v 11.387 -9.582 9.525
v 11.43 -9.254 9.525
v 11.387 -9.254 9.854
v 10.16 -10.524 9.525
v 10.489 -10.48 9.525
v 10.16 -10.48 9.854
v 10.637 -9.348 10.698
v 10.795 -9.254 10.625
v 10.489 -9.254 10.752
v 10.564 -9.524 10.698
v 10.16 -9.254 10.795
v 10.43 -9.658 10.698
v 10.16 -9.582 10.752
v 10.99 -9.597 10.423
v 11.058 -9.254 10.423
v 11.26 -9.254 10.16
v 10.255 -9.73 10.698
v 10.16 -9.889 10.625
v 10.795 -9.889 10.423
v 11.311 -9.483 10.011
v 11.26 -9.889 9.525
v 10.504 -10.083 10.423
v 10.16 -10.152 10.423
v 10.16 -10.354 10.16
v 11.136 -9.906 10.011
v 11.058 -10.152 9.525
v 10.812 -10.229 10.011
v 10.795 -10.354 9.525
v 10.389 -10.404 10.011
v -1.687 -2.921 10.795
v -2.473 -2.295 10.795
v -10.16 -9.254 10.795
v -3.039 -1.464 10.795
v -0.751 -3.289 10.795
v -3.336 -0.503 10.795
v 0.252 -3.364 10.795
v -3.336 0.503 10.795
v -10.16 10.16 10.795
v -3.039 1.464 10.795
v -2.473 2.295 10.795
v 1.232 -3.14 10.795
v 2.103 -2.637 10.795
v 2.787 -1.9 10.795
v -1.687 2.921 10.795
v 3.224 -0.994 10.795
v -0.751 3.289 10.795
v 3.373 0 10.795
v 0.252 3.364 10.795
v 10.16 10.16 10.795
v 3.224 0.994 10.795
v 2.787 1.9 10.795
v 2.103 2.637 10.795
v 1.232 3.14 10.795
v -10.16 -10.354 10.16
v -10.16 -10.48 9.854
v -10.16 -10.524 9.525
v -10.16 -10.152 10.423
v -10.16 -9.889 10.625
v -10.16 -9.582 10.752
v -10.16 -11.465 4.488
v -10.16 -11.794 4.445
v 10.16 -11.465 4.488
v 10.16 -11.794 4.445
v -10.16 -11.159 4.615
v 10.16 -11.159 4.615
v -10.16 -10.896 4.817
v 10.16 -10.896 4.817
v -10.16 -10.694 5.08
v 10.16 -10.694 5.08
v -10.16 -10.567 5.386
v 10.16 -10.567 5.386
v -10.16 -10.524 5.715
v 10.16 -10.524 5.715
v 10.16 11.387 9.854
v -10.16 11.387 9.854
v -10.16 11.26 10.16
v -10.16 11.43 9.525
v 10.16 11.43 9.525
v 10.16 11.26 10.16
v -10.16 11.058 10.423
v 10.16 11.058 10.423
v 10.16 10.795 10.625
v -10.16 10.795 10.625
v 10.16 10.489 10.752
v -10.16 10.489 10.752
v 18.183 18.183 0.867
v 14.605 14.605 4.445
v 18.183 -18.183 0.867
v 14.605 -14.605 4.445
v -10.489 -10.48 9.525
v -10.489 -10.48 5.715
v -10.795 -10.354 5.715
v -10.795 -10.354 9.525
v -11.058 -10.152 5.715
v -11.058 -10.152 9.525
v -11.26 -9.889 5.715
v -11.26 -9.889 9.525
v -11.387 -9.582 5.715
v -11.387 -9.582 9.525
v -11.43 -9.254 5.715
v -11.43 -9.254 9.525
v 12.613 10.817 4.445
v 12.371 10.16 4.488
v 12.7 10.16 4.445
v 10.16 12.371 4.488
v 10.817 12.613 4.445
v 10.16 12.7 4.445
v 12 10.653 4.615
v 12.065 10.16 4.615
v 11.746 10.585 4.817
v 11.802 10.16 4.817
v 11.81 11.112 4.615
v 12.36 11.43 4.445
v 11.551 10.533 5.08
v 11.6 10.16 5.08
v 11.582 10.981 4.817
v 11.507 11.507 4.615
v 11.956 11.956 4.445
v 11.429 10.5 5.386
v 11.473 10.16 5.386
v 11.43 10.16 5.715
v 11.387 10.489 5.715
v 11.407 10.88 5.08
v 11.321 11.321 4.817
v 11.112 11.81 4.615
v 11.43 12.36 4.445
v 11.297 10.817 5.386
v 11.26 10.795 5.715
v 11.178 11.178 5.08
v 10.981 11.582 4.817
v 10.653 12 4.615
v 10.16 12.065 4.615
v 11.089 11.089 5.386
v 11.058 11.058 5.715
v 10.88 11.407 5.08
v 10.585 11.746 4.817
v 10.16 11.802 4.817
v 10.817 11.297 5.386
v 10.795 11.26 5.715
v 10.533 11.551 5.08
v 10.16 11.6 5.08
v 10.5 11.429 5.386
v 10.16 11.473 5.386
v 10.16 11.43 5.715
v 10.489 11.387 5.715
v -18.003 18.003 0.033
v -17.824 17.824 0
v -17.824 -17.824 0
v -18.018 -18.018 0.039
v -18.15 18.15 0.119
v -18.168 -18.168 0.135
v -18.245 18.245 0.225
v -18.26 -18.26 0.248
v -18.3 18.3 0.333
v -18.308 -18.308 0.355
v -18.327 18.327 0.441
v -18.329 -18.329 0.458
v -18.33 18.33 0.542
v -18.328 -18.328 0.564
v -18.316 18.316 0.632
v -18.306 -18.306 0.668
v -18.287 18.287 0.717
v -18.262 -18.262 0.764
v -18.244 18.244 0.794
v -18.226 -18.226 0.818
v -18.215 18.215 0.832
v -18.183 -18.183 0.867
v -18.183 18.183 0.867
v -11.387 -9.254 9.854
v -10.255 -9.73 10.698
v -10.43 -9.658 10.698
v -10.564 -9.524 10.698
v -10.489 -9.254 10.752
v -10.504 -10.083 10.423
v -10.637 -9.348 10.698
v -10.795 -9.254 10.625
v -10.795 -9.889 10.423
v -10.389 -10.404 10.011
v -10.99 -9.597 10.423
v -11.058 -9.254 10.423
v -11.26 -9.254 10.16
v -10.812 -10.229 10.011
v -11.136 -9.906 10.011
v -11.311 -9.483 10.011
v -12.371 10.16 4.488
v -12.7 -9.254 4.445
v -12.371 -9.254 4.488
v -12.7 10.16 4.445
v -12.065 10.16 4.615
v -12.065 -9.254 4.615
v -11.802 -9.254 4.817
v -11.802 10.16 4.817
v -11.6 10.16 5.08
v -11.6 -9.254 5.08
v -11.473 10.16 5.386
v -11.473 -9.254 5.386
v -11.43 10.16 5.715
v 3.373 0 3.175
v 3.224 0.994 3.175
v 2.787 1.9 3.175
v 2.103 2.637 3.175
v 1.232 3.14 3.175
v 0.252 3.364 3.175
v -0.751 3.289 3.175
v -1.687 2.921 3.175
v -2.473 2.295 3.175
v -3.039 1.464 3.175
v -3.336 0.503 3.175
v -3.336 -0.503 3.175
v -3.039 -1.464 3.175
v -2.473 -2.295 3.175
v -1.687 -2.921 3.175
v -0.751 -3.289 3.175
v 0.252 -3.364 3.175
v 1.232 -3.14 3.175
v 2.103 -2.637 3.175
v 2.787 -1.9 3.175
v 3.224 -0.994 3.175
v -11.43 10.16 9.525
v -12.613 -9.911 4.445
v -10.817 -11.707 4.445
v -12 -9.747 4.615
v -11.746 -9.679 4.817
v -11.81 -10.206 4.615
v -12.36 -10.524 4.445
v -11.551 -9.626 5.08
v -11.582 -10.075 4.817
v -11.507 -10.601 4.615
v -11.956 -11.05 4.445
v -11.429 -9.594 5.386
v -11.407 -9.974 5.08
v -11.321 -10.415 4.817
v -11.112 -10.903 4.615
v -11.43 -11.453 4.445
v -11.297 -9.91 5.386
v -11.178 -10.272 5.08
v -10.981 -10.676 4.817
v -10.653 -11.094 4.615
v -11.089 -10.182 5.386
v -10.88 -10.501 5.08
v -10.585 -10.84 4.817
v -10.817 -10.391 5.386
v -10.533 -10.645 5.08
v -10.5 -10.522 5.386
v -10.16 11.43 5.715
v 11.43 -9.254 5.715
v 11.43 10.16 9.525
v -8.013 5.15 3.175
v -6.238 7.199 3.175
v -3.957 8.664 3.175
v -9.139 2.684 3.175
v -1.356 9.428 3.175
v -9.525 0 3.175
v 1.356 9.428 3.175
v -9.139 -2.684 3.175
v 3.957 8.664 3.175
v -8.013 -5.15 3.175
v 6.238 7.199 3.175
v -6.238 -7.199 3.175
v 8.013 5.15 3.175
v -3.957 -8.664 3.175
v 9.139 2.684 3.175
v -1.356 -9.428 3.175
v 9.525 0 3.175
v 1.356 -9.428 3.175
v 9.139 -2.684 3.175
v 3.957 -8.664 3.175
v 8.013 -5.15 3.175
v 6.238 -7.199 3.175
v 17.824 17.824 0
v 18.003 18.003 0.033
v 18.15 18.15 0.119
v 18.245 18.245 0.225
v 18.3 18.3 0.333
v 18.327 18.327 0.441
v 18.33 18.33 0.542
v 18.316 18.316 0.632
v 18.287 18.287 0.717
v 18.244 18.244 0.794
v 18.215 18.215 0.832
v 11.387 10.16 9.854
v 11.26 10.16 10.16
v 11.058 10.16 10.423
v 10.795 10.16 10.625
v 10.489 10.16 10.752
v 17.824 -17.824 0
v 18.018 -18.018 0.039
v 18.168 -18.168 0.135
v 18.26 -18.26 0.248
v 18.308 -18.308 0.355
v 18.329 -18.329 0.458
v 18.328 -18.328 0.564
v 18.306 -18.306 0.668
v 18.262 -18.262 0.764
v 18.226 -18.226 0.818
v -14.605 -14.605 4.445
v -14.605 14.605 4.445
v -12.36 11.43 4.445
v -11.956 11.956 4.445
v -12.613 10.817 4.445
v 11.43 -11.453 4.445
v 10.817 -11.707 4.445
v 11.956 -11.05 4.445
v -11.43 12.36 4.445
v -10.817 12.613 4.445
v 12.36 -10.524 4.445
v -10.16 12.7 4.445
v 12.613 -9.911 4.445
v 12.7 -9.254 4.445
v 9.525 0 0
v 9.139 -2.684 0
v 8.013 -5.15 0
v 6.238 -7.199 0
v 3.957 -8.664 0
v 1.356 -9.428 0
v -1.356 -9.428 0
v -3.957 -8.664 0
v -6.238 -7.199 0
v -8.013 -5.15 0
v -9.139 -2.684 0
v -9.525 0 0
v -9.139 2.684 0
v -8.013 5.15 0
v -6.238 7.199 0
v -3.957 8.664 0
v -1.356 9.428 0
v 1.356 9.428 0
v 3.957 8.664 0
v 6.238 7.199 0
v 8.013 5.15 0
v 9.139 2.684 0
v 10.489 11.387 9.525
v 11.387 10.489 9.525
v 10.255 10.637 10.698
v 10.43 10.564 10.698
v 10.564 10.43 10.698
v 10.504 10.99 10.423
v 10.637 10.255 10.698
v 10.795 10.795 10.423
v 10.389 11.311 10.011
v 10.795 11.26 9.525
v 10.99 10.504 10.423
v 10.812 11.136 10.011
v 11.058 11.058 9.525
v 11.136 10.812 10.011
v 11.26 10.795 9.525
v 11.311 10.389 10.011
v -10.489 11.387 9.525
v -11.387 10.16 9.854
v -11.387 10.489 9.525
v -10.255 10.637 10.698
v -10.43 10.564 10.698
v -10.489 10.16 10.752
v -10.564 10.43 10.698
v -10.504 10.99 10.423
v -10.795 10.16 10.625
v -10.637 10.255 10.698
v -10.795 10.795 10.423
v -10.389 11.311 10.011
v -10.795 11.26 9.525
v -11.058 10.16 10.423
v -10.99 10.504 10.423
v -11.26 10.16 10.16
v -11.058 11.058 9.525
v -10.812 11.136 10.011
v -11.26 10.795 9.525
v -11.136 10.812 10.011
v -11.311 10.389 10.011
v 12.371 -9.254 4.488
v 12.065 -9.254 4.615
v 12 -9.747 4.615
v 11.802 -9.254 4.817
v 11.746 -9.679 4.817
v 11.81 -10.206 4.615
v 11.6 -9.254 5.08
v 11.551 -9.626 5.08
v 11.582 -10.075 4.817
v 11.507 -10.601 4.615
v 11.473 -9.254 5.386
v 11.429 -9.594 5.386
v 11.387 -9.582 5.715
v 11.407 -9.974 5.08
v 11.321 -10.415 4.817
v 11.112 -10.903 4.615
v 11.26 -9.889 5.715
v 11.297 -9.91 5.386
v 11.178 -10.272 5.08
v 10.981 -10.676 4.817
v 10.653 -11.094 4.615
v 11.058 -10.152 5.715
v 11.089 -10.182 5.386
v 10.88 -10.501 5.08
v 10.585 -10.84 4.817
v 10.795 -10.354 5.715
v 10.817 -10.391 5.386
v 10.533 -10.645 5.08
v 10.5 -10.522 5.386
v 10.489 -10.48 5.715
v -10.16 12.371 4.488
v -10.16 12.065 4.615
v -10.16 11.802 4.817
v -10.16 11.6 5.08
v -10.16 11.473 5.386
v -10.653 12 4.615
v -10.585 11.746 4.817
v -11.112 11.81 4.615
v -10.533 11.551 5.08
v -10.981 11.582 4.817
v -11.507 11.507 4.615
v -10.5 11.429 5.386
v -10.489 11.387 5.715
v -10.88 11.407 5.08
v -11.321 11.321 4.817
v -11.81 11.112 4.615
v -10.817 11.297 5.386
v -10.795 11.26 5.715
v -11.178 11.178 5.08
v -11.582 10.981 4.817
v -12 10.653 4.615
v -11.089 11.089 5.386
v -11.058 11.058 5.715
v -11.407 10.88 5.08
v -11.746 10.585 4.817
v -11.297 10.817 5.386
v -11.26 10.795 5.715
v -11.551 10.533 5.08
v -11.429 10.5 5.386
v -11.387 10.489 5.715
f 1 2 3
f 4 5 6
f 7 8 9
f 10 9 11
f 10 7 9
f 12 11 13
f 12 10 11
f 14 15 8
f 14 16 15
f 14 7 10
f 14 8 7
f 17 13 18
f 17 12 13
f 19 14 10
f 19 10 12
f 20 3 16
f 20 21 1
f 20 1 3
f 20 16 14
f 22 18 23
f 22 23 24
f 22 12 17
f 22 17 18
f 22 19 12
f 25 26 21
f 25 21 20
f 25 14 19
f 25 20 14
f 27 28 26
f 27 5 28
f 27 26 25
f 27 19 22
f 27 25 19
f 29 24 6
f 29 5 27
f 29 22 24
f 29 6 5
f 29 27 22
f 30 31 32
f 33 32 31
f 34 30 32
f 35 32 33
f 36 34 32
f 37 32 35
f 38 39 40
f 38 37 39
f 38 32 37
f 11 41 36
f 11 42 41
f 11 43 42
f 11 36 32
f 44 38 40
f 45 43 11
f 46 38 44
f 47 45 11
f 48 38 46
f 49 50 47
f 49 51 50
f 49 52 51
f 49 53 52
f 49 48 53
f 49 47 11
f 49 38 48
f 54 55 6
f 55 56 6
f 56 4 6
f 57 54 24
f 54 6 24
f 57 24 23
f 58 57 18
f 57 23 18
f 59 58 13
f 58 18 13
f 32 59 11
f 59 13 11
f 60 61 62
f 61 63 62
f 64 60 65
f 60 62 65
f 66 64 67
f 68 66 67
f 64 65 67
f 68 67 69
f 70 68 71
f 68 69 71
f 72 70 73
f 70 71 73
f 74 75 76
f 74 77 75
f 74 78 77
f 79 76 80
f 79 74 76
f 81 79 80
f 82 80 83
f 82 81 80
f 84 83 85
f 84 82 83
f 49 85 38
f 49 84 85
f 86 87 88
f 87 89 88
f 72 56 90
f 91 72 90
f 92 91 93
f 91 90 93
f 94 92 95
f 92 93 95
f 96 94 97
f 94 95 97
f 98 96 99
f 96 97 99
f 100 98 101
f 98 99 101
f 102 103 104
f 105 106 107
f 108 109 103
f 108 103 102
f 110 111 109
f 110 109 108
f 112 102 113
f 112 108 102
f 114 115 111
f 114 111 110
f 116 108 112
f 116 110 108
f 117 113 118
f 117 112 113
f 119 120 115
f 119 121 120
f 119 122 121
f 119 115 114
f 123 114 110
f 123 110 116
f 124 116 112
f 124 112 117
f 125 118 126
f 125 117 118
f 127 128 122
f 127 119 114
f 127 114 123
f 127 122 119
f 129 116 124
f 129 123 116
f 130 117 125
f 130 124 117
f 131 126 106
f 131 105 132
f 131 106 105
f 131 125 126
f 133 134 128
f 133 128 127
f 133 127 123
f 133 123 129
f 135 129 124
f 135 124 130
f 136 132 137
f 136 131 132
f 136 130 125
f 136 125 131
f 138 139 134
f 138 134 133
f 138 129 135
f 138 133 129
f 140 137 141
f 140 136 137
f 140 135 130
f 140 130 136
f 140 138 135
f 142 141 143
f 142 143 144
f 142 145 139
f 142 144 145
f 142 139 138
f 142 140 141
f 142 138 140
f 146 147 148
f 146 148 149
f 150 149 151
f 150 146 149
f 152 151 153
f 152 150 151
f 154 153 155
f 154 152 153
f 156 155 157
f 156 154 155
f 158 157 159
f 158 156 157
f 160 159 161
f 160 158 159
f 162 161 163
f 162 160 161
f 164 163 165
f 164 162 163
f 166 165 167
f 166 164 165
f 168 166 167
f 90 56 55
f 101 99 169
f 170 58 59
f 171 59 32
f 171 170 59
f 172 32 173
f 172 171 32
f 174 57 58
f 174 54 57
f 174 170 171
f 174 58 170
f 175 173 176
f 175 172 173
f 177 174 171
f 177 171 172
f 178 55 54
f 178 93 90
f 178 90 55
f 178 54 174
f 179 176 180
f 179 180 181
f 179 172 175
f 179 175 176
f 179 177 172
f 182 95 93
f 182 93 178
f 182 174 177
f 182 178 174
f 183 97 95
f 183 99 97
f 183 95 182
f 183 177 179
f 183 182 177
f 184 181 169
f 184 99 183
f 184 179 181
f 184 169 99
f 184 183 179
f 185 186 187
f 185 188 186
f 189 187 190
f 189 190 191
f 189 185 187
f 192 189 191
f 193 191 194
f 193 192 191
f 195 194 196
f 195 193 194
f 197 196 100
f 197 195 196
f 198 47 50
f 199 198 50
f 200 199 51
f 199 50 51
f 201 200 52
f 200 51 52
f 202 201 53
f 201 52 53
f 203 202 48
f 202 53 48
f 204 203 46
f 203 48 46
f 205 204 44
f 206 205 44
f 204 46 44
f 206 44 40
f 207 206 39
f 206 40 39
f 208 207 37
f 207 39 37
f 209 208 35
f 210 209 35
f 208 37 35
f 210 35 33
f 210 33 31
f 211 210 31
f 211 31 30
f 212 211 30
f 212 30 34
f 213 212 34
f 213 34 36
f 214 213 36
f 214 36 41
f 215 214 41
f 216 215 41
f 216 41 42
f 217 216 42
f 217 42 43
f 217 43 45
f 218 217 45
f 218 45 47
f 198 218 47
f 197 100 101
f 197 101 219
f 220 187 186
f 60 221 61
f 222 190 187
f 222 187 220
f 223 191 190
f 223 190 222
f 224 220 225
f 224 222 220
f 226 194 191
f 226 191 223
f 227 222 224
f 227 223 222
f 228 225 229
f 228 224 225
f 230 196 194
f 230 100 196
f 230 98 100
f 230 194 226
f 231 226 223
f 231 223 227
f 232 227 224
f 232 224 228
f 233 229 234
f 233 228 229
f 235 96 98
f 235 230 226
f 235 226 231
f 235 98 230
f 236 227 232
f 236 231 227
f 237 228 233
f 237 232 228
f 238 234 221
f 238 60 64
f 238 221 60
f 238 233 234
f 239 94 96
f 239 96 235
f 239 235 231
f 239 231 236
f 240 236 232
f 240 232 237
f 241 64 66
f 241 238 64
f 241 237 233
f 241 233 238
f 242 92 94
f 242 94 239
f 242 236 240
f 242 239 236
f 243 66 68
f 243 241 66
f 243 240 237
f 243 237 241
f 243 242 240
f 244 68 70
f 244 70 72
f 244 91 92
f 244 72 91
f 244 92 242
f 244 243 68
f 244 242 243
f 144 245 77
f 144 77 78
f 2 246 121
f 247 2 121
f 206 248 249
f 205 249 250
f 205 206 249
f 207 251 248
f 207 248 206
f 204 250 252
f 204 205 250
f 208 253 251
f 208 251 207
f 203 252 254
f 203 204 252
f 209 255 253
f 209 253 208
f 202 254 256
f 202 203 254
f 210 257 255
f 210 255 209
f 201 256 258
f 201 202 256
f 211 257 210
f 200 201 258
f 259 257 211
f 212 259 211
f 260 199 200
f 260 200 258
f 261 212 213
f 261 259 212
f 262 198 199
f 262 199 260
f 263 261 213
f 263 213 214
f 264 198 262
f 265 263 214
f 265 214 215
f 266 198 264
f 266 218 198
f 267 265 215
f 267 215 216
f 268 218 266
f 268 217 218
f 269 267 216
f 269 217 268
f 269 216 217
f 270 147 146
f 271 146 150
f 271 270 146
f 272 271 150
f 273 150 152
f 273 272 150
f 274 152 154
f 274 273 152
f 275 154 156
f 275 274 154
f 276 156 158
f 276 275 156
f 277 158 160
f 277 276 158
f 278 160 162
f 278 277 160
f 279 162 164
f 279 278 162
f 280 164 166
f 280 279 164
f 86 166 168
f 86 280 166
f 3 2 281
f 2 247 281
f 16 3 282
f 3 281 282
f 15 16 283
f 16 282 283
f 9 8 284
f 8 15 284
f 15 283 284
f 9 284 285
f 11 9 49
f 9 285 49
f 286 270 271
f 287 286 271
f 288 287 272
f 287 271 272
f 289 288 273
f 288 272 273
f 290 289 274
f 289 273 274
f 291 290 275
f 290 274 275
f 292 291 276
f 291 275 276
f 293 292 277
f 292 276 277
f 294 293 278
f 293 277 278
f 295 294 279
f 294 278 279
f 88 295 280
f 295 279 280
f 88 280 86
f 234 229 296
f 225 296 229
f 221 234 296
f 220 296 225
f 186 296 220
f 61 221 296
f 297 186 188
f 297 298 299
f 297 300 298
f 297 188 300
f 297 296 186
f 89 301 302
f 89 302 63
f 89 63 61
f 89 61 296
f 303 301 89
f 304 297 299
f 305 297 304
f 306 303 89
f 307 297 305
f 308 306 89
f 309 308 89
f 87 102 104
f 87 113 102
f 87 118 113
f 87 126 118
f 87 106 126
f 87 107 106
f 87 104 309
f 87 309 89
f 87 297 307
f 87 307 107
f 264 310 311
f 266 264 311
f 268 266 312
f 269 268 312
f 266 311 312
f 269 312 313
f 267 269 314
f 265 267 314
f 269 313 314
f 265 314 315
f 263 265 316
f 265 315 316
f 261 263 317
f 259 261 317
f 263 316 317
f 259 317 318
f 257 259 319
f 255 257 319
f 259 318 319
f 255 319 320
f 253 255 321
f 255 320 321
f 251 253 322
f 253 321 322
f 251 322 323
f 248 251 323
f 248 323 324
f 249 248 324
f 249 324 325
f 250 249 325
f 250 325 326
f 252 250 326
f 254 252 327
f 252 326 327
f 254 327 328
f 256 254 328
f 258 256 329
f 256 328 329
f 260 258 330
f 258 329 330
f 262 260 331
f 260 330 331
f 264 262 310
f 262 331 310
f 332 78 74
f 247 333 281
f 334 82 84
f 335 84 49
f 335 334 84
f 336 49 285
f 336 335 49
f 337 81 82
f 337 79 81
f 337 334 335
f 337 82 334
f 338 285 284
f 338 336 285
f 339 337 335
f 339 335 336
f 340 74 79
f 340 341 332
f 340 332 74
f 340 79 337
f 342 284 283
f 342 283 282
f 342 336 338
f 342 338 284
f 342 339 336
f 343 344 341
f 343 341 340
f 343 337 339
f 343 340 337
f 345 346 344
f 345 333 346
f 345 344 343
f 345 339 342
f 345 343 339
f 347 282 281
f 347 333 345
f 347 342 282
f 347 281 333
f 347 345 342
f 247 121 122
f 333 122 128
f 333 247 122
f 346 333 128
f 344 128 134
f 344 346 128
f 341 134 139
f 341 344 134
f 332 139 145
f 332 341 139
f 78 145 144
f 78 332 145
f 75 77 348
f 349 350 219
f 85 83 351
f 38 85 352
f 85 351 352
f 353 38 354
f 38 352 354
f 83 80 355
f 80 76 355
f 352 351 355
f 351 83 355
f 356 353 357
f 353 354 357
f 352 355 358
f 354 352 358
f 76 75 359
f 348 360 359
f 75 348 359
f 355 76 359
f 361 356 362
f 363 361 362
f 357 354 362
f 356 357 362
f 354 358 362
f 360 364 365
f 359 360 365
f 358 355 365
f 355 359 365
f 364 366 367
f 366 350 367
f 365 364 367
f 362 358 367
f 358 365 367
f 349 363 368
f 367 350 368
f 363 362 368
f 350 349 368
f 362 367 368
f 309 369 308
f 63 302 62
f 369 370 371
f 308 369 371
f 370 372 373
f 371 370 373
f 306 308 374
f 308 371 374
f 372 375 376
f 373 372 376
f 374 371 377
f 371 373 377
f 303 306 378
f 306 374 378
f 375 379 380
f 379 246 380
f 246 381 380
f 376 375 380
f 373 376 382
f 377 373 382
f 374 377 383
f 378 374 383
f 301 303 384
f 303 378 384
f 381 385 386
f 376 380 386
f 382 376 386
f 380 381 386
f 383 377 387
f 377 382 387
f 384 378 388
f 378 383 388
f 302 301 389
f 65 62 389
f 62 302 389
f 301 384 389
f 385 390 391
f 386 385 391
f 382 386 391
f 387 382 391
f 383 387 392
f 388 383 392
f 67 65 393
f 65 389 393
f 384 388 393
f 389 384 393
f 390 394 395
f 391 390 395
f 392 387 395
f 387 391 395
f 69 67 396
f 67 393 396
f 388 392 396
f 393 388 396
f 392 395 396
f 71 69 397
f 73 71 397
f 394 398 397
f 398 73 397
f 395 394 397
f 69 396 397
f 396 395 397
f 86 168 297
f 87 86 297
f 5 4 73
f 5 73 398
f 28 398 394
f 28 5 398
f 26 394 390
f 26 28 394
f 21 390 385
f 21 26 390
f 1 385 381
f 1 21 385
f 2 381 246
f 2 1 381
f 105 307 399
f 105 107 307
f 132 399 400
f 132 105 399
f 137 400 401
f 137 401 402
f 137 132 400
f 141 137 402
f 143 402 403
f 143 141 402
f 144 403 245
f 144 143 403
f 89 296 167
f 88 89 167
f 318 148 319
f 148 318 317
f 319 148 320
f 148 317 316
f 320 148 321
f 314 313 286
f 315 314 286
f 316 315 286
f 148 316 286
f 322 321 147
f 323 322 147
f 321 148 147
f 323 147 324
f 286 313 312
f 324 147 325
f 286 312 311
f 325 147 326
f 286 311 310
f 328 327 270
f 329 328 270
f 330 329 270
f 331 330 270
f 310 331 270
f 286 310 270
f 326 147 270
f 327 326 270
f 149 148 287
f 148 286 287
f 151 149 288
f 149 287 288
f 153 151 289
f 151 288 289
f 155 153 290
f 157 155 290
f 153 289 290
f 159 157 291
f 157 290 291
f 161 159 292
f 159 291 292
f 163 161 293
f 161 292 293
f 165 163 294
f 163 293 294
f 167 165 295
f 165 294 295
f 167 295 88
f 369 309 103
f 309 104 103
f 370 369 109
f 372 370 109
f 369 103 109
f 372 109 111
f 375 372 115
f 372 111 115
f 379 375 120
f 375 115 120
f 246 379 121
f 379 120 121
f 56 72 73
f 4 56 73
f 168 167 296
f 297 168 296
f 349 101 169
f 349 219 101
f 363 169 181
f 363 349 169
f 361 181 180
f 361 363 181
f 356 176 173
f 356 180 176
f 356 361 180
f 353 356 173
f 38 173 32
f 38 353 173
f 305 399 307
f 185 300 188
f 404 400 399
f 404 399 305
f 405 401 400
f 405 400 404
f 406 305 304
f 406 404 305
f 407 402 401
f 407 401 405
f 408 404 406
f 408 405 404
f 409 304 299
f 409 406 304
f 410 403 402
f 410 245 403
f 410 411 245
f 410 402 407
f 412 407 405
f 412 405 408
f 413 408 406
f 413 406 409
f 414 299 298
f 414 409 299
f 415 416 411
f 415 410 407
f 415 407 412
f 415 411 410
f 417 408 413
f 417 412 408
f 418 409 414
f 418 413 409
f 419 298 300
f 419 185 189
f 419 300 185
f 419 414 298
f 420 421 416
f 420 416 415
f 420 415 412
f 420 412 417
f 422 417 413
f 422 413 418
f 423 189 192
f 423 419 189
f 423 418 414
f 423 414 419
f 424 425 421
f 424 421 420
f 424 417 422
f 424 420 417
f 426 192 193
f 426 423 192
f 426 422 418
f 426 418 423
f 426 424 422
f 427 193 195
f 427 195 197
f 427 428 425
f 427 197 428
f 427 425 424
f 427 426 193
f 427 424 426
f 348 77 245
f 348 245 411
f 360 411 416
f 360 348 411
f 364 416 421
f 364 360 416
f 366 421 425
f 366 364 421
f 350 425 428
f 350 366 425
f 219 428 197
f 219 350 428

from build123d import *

# Parameters (mm, degrees)
F0_W      = 38.1
F0_H      = 38.1
F1_DEPTH  = 4.445
F4_DEPTH  = 38.101
F5_DEPTH  = 38.101
F6_R      = 0.508
F7_W      = 22.86
F7_H      = 21.9536569705
F8_DEPTH  = 6.35
F9_R      = 3.3734375
F10_DEPTH = 10.7965917968
F11_R     = 9.525
F12_DEPTH = 3.175
F13_R     = 1.27


with BuildPart() as f1:
    # F0 (on Top) → F1 (new body)
    with BuildSketch(Plane.XY):
        Rectangle(F0_W, F0_H)
    extrude(amount=F1_DEPTH)

    # F2 (on face) → F4 (cut, through all)
    with BuildSketch(Plane.XZ.offset(19.05)):
        Polygon((-19.05, 4.445), (-19.05, 0), (-14.605, 4.445), align=None)
        Polygon((14.605, 4.445), (19.05, 0), (19.05, 4.445), align=None)
    extrude(amount=-F4_DEPTH, mode=Mode.SUBTRACT)

    # F3 (on face) → F5 (cut, through all)
    with BuildSketch(Plane(origin=(-19.05, 0, 0), x_dir=(0, -1, 0), z_dir=(-1, 0, 0))):
        Polygon((-19.05, 4.445), (-19.05, 0), (-14.605, 4.445), align=None)
        Polygon((14.605, 4.445), (19.05, 0), (19.05, 4.445), align=None)
    extrude(amount=-F5_DEPTH, mode=Mode.SUBTRACT)

    # F6
    f6_edges = [f1.edges().sort_by_distance(p)[0] for p in [
        (19.05, 0, 0),
        (0, -19.05, 0),
        (-19.05, 0, 0),
        (0, 19.05, 0),
    ]]
    fillet(f6_edges, radius=F6_R)

    # F7 (on face) → F8 (join)
    with BuildSketch(Plane.XY.offset(4.445)):
        with Locations((0, 0.4531715147)):
            Rectangle(F7_W, F7_H)
    extrude(amount=F8_DEPTH)

    # F9 (on face) → F10 (cut, through all)
    with BuildSketch(Plane.XY.offset(10.795)):
        Circle(F9_R)
    extrude(amount=-F10_DEPTH, mode=Mode.SUBTRACT)

    # F11 (on face) → F12 (cut)
    with BuildSketch(Plane(origin=(0, 0, 0), x_dir=(1, 0, 0), z_dir=(0, 0, -1))):
        Circle(F11_R)
    extrude(amount=-F12_DEPTH, mode=Mode.SUBTRACT)

    # F13
    f13_edges = [f1.edges().sort_by_distance(p)[0] for p in [
        (-11.43, 0.453172, 4.445),
        (0, -10.523657, 4.445),
        (-11.43, -10.523657, 7.62),
        (-11.43, 11.43, 7.62),
        (11.43, 11.43, 7.62),
        (11.43, -10.523657, 7.62),
        (0, 11.43, 10.795),
        (11.43, 0.453172, 10.795),
        (0, -10.523657, 10.795),
        (-18.18279, 0, 0.86721),
        (-11.43, 0.453172, 10.795),
        (11.43, 0.453172, 4.445),
        (0, 11.43, 4.445),
    ]]
    fillet(f13_edges, radius=F13_R)


solid = f1.part
